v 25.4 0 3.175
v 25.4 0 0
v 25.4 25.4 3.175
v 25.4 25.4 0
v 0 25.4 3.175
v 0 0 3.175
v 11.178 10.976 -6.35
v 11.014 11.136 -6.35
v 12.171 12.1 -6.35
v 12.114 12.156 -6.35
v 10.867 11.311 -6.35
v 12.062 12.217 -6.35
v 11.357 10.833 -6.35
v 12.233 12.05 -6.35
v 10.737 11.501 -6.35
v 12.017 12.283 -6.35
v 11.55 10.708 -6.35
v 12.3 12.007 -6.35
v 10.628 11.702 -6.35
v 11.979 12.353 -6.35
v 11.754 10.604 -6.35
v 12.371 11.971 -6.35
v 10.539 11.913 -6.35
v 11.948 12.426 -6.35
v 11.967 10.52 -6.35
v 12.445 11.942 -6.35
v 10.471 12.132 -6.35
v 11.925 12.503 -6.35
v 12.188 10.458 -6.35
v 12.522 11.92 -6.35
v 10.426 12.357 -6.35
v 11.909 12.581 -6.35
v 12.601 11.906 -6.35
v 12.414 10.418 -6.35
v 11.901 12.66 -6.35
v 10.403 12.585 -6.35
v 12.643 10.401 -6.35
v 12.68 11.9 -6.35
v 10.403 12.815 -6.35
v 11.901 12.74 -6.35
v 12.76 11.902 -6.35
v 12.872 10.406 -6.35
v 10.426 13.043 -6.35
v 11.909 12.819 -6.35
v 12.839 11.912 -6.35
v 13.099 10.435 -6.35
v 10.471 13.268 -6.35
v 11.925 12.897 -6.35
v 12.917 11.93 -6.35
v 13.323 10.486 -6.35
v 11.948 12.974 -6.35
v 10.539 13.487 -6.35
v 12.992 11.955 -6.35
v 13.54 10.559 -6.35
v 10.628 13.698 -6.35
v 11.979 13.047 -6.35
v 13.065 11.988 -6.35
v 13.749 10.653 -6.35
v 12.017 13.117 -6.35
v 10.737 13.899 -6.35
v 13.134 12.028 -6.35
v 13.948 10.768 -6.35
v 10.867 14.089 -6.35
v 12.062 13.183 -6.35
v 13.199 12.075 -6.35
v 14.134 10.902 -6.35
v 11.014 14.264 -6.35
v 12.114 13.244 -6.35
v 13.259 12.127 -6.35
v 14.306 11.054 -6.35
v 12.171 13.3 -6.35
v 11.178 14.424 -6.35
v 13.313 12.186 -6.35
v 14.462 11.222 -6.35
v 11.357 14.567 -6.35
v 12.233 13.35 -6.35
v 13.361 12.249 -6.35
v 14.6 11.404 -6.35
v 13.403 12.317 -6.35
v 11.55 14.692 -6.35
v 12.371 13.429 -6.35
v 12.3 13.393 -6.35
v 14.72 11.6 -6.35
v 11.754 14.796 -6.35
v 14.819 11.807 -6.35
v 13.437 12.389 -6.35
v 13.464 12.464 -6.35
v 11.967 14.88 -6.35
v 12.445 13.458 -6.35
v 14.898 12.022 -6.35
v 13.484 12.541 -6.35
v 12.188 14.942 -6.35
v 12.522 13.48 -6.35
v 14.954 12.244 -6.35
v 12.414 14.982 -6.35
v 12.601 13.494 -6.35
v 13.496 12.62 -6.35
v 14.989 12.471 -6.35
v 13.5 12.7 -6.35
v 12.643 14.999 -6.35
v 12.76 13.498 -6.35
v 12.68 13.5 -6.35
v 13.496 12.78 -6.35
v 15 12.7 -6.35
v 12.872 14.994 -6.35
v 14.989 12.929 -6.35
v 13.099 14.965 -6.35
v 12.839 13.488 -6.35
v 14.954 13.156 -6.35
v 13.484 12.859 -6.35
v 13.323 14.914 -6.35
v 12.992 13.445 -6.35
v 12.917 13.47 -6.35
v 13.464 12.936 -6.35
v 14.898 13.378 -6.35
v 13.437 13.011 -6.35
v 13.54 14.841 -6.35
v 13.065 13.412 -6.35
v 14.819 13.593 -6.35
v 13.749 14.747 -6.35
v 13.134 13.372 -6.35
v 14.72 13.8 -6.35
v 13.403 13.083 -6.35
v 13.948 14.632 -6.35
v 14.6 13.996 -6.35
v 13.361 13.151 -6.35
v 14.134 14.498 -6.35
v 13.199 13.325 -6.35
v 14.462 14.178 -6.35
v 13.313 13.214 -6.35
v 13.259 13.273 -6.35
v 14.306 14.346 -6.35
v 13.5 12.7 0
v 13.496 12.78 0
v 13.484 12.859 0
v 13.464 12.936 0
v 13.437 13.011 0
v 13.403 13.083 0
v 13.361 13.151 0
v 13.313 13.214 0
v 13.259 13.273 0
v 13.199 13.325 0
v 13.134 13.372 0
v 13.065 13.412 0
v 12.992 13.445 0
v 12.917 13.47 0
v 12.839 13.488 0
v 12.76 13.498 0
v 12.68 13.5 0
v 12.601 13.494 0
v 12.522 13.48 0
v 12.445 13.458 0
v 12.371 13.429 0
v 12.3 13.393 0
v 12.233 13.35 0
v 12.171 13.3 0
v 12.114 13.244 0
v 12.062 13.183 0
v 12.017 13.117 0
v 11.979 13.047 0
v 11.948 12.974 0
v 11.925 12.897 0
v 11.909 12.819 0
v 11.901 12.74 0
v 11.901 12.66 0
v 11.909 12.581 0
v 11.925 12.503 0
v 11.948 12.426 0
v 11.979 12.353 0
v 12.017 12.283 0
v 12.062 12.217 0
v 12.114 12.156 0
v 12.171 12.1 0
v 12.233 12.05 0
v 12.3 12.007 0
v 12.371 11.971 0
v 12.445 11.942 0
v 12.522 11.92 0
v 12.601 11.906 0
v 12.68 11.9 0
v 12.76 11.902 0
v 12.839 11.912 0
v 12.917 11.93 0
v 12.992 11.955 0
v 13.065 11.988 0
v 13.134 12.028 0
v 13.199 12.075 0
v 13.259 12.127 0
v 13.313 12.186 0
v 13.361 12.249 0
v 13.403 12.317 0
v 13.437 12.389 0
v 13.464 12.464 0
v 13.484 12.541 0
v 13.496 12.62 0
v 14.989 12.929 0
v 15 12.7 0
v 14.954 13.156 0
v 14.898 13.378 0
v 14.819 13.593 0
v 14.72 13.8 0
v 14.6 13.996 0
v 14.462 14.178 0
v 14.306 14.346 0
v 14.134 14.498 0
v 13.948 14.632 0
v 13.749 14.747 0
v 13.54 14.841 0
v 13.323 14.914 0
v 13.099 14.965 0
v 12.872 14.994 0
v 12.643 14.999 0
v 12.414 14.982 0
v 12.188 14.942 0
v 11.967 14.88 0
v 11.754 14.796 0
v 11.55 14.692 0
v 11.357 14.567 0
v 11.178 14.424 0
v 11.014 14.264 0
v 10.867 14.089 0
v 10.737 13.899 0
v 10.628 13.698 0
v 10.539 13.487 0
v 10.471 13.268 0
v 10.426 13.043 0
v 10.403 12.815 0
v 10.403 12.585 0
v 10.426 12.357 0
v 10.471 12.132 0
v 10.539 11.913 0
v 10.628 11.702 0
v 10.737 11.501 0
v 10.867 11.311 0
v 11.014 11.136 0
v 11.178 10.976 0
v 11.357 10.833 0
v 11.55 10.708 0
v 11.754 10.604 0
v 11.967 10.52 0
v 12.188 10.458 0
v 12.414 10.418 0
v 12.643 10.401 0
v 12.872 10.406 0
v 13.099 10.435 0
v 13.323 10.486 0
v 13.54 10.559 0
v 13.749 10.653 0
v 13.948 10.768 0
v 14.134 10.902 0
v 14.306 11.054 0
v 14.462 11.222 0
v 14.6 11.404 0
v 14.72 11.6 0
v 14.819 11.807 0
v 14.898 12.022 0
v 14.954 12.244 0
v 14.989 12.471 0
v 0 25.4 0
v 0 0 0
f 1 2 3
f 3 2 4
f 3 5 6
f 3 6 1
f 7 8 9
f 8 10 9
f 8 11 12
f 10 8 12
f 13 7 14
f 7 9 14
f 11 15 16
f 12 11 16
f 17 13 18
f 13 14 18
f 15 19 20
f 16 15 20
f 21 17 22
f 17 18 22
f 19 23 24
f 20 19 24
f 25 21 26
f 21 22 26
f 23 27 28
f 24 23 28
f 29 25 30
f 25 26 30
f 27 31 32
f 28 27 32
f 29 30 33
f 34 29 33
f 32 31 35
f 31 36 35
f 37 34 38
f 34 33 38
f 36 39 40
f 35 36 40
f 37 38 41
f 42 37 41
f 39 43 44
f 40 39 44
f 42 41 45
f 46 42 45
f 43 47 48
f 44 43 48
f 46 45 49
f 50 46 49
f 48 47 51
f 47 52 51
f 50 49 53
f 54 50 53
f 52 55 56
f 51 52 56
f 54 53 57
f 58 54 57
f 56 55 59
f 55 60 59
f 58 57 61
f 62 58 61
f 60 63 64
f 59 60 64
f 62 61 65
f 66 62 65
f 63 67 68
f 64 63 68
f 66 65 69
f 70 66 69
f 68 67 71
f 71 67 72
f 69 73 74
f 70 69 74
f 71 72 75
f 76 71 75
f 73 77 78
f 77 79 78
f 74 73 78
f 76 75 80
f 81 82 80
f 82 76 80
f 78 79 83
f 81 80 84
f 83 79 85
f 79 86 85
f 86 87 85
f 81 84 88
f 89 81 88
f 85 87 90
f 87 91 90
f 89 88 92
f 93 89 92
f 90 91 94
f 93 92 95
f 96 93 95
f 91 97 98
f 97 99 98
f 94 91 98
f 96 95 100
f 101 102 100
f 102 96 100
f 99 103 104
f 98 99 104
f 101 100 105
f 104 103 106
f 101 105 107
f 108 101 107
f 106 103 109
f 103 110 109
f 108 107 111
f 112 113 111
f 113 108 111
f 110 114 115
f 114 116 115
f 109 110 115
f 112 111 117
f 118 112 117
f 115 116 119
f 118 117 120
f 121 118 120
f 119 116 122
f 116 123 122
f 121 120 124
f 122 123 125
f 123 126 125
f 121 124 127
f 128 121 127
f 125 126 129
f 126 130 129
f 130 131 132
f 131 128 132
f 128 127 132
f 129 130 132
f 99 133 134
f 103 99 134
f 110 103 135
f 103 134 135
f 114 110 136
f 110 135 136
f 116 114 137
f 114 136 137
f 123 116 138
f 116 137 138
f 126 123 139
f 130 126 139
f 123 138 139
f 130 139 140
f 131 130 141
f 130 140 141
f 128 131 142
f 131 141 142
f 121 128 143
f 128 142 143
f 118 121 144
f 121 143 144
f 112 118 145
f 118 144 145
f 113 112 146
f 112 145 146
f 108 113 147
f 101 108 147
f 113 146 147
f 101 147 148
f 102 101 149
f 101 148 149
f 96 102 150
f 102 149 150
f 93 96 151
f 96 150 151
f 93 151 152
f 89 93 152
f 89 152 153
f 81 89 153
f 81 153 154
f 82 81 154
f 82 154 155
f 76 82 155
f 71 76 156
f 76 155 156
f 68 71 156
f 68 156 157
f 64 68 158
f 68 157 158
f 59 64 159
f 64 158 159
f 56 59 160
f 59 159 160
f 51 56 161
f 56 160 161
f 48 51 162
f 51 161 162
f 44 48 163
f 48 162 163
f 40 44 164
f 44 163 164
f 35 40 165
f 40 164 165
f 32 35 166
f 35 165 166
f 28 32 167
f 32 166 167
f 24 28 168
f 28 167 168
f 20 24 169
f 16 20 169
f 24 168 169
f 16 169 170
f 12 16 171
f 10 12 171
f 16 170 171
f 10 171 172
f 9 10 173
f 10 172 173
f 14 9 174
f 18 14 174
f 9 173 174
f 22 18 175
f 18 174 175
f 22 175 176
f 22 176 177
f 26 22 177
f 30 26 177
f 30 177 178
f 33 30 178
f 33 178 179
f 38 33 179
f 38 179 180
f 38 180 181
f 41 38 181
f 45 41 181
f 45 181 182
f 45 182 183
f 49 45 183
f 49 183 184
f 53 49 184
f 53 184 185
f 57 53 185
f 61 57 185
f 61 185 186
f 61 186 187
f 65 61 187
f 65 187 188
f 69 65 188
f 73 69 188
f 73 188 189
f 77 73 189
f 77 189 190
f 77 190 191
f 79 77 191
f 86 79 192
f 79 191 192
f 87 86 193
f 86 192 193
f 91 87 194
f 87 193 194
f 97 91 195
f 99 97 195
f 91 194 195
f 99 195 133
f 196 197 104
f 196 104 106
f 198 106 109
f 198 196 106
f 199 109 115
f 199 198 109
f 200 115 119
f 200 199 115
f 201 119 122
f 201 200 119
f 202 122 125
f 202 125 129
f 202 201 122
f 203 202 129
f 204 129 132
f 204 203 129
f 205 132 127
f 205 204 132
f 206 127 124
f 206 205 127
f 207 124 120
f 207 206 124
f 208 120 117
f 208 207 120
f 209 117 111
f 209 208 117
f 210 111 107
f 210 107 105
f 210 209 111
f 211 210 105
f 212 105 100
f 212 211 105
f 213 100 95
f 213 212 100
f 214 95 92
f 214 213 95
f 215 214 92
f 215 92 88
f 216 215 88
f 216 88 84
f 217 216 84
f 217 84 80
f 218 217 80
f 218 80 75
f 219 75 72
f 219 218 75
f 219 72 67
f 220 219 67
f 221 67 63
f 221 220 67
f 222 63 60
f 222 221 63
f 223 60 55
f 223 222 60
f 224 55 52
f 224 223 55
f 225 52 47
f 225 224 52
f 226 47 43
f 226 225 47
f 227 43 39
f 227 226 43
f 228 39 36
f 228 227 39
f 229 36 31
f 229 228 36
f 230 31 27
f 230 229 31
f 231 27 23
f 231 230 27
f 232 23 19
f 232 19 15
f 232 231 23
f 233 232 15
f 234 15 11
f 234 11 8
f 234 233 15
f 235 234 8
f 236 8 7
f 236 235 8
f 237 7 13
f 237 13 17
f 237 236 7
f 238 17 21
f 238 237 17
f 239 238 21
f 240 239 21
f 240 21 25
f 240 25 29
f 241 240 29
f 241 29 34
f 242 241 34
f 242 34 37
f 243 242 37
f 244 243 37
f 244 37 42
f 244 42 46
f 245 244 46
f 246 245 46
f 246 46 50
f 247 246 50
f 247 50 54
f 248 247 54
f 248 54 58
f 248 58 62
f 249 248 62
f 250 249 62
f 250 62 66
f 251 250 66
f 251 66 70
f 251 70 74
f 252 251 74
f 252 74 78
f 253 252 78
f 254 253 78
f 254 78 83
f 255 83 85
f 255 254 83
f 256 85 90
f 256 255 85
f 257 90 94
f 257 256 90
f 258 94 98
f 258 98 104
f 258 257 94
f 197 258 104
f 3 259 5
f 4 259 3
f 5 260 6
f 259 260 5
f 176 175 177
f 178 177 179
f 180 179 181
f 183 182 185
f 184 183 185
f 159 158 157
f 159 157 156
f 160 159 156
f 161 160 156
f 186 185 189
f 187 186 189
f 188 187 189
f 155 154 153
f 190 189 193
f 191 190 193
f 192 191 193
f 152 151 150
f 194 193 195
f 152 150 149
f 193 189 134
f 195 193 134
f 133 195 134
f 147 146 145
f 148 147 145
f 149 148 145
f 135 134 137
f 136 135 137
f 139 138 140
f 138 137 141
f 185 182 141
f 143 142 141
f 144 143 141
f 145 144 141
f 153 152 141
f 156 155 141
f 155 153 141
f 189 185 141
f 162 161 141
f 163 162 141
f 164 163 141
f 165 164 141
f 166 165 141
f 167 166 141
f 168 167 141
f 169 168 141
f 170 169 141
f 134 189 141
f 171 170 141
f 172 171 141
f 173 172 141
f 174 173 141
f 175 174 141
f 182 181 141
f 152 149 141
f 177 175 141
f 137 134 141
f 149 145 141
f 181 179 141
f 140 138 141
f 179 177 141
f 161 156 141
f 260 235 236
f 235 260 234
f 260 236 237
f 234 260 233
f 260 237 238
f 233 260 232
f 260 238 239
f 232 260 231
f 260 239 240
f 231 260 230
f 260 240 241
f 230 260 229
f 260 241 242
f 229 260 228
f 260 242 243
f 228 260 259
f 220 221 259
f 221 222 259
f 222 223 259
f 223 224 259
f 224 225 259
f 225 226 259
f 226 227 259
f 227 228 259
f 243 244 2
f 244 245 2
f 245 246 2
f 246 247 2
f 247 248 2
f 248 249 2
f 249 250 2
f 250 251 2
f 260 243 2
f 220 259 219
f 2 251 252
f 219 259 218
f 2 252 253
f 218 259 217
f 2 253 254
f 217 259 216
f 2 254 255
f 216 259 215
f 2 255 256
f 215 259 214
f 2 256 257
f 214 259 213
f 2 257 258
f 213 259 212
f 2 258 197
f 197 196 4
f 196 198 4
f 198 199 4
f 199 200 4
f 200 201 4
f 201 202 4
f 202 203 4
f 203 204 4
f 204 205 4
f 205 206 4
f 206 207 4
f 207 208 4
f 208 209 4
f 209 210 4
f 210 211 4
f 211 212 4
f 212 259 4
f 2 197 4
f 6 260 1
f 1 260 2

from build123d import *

# Parameters (mm, degrees)
F0_W     = 25.4
F0_H     = 25.4
F0_R     = 2.3
F0_R_2   = 0.8
F1_DEPTH = 3.175
F2_DEPTH = 6.35


with BuildPart() as f1:
    # F0 (on Top) → F1 (new body)
    with BuildSketch(Plane.XY):
        with Locations((12.7, 12.7)):
            Rectangle(F0_W, F0_H)
        with Locations((12.7, 12.7)):
            Circle(F0_R, mode=Mode.SUBTRACT)
        with Locations((12.7, 12.7)):
            Circle(F0_R)
        with Locations((12.7, 12.7)):
            Circle(F0_R_2, mode=Mode.SUBTRACT)
        with Locations((12.7, 12.7)):
            Circle(F0_R_2)
    extrude(amount=F1_DEPTH)

    # F0 (on Top) → F2 (join)
    with BuildSketch(Plane.XY):
        with Locations((12.7, 12.7)):
            Circle(F0_R)
        with Locations((12.7, 12.7)):
            Circle(F0_R_2, mode=Mode.SUBTRACT)
    extrude(amount=-F2_DEPTH)


solid = f1.part
